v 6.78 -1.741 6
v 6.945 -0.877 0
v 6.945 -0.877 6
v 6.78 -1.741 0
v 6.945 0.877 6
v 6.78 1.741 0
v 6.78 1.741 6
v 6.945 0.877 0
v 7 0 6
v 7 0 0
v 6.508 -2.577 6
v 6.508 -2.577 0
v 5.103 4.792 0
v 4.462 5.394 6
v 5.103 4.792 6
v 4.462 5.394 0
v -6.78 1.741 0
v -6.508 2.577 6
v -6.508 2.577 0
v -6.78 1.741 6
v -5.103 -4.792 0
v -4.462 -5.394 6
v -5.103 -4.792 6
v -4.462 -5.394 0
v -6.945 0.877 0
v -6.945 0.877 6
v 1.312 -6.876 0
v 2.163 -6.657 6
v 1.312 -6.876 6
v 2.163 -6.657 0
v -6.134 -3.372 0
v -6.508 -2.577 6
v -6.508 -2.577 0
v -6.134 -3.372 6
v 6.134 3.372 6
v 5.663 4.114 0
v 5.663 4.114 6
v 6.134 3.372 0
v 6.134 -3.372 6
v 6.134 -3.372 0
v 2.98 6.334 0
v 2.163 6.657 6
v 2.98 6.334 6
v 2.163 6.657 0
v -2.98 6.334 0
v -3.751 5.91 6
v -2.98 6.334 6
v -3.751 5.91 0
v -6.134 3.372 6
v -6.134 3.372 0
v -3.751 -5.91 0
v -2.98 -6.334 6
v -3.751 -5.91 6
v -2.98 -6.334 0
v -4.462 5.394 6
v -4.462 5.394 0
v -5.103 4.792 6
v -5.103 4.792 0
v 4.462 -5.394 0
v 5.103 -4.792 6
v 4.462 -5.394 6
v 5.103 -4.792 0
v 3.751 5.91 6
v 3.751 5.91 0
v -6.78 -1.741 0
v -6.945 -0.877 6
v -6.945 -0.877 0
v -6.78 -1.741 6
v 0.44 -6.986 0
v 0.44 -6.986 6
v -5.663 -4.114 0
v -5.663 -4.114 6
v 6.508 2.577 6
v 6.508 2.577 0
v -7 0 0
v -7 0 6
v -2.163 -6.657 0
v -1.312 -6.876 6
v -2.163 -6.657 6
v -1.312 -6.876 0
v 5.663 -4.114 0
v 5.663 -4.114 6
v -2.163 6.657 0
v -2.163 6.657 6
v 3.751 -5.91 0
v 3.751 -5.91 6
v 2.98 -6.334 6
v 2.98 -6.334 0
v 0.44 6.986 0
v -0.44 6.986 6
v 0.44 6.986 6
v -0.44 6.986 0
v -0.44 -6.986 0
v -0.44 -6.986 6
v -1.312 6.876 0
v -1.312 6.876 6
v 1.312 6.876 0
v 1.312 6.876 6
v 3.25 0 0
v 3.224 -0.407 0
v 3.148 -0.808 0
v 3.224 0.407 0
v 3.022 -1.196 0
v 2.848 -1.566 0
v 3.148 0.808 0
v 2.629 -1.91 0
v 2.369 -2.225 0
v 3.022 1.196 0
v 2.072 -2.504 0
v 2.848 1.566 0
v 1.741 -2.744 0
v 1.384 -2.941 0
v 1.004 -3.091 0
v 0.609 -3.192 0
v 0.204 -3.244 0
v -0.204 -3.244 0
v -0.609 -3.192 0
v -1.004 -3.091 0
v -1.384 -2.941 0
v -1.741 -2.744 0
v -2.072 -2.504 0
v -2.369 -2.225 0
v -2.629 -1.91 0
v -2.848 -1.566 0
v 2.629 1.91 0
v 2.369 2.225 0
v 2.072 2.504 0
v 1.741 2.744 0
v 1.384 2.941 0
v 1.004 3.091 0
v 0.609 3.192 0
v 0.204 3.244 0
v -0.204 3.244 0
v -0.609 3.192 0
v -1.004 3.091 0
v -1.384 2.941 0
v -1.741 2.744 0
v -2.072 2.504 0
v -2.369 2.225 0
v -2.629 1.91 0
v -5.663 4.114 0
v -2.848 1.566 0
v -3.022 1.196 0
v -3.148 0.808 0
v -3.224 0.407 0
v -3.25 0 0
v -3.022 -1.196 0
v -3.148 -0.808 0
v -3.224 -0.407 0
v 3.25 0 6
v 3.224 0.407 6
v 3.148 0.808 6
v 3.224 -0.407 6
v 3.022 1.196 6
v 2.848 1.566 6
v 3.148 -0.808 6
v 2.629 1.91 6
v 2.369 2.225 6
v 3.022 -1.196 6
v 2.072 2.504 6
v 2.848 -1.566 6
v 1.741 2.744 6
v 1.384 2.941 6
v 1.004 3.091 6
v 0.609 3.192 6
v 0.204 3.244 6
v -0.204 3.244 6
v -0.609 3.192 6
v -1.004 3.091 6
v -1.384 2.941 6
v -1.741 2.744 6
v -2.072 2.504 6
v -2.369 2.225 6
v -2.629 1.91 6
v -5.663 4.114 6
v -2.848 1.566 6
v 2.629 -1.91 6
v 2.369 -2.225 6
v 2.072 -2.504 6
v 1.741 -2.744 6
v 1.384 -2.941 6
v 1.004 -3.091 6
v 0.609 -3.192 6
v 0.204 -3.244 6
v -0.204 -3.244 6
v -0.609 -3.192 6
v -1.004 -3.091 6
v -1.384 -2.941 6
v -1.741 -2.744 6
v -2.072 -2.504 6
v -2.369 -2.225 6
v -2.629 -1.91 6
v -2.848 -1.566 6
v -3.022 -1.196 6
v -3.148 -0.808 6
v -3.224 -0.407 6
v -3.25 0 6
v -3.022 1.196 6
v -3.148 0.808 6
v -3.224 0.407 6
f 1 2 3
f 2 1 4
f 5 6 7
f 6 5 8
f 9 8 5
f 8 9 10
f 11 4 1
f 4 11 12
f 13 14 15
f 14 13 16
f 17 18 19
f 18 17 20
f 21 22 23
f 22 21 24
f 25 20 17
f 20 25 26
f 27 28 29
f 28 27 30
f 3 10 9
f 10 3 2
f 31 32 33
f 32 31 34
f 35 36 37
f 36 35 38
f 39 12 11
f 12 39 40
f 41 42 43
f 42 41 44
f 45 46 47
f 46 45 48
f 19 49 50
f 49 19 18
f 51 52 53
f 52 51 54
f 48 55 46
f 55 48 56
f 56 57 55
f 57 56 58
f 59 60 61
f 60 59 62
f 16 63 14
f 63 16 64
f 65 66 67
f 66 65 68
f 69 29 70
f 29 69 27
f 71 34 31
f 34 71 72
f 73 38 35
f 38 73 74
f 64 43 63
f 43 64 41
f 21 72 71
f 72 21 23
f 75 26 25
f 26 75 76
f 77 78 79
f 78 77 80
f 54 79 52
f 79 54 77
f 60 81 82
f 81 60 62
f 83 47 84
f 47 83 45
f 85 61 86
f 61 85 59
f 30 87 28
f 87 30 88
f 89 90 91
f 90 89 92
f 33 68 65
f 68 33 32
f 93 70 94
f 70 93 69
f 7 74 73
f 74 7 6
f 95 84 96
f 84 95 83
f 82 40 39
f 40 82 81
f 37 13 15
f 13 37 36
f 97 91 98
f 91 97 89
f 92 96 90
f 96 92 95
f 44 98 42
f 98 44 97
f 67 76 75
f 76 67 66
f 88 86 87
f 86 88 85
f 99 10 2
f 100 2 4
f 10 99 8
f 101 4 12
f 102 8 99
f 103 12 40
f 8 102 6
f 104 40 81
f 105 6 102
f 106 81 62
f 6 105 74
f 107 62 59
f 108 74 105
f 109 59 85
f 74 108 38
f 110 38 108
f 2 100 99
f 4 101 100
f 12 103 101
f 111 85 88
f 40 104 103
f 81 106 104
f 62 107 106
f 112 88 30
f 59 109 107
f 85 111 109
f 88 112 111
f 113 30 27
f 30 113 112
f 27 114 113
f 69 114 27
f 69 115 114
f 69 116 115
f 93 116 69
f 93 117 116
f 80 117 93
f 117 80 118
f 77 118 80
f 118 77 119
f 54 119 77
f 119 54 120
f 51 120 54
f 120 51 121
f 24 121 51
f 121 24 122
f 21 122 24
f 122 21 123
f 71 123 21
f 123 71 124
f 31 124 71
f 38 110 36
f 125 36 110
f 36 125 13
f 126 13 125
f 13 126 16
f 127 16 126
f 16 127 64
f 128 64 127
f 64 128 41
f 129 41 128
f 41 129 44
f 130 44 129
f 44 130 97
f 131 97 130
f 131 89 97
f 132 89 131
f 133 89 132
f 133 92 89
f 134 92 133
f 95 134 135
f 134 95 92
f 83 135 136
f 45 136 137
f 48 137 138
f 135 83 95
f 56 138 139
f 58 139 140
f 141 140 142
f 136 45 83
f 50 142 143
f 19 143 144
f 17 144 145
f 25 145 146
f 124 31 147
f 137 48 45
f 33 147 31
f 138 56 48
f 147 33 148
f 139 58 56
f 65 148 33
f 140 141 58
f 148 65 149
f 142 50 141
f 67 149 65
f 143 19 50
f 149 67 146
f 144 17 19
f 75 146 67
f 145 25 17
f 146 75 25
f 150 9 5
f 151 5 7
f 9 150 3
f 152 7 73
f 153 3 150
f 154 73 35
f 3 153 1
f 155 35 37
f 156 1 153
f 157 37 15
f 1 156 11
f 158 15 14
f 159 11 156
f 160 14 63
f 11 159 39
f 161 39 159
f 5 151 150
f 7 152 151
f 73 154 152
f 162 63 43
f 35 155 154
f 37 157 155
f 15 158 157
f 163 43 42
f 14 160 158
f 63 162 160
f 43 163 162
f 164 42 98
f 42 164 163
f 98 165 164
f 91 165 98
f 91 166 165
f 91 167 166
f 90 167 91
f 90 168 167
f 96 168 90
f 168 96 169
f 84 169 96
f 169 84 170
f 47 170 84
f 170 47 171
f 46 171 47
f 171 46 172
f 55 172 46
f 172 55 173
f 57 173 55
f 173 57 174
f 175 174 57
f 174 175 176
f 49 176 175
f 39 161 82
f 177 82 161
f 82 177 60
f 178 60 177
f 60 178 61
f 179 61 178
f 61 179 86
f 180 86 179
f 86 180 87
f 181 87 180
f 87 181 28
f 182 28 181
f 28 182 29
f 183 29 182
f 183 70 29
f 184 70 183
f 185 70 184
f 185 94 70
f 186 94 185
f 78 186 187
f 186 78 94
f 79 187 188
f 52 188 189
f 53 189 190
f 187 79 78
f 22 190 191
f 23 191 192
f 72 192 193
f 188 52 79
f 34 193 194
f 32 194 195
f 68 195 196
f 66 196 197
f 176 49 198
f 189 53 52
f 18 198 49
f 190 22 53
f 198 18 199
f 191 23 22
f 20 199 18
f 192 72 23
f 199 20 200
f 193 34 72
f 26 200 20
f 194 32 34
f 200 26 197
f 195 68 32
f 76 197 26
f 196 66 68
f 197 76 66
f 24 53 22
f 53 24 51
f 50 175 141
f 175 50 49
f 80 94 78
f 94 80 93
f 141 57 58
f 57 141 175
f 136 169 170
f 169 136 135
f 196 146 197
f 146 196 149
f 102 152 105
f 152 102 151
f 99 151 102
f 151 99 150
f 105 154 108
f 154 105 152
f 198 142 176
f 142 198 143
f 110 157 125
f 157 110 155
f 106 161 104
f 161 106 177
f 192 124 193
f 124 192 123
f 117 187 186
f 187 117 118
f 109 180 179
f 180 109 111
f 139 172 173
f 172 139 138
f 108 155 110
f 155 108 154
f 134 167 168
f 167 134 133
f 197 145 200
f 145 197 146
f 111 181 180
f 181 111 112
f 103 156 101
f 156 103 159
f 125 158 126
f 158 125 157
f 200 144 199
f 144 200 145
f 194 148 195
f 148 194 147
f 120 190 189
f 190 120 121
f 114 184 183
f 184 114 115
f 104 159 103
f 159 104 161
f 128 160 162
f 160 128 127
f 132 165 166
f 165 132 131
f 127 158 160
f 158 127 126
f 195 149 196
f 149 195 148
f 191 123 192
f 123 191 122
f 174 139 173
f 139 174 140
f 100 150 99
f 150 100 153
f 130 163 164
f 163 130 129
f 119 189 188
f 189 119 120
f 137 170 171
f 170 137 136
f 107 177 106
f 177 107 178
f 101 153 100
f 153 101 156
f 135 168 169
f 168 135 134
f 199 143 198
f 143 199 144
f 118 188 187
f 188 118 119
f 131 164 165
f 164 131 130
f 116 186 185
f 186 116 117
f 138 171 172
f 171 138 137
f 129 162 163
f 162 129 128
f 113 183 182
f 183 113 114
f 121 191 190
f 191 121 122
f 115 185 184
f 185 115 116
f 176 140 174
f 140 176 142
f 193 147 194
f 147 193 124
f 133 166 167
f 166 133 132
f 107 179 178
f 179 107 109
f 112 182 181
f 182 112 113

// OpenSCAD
$fn = 50;


difference() {
	union() {
		cylinder(h = 6, r = 7.0000000000);
	}
	union() {
		translate(v = [0.0000000000, 0.0000000000, -100.0000000000]) {
			cylinder(h = 200, r = 3.2500000000);
		}
	}
}
